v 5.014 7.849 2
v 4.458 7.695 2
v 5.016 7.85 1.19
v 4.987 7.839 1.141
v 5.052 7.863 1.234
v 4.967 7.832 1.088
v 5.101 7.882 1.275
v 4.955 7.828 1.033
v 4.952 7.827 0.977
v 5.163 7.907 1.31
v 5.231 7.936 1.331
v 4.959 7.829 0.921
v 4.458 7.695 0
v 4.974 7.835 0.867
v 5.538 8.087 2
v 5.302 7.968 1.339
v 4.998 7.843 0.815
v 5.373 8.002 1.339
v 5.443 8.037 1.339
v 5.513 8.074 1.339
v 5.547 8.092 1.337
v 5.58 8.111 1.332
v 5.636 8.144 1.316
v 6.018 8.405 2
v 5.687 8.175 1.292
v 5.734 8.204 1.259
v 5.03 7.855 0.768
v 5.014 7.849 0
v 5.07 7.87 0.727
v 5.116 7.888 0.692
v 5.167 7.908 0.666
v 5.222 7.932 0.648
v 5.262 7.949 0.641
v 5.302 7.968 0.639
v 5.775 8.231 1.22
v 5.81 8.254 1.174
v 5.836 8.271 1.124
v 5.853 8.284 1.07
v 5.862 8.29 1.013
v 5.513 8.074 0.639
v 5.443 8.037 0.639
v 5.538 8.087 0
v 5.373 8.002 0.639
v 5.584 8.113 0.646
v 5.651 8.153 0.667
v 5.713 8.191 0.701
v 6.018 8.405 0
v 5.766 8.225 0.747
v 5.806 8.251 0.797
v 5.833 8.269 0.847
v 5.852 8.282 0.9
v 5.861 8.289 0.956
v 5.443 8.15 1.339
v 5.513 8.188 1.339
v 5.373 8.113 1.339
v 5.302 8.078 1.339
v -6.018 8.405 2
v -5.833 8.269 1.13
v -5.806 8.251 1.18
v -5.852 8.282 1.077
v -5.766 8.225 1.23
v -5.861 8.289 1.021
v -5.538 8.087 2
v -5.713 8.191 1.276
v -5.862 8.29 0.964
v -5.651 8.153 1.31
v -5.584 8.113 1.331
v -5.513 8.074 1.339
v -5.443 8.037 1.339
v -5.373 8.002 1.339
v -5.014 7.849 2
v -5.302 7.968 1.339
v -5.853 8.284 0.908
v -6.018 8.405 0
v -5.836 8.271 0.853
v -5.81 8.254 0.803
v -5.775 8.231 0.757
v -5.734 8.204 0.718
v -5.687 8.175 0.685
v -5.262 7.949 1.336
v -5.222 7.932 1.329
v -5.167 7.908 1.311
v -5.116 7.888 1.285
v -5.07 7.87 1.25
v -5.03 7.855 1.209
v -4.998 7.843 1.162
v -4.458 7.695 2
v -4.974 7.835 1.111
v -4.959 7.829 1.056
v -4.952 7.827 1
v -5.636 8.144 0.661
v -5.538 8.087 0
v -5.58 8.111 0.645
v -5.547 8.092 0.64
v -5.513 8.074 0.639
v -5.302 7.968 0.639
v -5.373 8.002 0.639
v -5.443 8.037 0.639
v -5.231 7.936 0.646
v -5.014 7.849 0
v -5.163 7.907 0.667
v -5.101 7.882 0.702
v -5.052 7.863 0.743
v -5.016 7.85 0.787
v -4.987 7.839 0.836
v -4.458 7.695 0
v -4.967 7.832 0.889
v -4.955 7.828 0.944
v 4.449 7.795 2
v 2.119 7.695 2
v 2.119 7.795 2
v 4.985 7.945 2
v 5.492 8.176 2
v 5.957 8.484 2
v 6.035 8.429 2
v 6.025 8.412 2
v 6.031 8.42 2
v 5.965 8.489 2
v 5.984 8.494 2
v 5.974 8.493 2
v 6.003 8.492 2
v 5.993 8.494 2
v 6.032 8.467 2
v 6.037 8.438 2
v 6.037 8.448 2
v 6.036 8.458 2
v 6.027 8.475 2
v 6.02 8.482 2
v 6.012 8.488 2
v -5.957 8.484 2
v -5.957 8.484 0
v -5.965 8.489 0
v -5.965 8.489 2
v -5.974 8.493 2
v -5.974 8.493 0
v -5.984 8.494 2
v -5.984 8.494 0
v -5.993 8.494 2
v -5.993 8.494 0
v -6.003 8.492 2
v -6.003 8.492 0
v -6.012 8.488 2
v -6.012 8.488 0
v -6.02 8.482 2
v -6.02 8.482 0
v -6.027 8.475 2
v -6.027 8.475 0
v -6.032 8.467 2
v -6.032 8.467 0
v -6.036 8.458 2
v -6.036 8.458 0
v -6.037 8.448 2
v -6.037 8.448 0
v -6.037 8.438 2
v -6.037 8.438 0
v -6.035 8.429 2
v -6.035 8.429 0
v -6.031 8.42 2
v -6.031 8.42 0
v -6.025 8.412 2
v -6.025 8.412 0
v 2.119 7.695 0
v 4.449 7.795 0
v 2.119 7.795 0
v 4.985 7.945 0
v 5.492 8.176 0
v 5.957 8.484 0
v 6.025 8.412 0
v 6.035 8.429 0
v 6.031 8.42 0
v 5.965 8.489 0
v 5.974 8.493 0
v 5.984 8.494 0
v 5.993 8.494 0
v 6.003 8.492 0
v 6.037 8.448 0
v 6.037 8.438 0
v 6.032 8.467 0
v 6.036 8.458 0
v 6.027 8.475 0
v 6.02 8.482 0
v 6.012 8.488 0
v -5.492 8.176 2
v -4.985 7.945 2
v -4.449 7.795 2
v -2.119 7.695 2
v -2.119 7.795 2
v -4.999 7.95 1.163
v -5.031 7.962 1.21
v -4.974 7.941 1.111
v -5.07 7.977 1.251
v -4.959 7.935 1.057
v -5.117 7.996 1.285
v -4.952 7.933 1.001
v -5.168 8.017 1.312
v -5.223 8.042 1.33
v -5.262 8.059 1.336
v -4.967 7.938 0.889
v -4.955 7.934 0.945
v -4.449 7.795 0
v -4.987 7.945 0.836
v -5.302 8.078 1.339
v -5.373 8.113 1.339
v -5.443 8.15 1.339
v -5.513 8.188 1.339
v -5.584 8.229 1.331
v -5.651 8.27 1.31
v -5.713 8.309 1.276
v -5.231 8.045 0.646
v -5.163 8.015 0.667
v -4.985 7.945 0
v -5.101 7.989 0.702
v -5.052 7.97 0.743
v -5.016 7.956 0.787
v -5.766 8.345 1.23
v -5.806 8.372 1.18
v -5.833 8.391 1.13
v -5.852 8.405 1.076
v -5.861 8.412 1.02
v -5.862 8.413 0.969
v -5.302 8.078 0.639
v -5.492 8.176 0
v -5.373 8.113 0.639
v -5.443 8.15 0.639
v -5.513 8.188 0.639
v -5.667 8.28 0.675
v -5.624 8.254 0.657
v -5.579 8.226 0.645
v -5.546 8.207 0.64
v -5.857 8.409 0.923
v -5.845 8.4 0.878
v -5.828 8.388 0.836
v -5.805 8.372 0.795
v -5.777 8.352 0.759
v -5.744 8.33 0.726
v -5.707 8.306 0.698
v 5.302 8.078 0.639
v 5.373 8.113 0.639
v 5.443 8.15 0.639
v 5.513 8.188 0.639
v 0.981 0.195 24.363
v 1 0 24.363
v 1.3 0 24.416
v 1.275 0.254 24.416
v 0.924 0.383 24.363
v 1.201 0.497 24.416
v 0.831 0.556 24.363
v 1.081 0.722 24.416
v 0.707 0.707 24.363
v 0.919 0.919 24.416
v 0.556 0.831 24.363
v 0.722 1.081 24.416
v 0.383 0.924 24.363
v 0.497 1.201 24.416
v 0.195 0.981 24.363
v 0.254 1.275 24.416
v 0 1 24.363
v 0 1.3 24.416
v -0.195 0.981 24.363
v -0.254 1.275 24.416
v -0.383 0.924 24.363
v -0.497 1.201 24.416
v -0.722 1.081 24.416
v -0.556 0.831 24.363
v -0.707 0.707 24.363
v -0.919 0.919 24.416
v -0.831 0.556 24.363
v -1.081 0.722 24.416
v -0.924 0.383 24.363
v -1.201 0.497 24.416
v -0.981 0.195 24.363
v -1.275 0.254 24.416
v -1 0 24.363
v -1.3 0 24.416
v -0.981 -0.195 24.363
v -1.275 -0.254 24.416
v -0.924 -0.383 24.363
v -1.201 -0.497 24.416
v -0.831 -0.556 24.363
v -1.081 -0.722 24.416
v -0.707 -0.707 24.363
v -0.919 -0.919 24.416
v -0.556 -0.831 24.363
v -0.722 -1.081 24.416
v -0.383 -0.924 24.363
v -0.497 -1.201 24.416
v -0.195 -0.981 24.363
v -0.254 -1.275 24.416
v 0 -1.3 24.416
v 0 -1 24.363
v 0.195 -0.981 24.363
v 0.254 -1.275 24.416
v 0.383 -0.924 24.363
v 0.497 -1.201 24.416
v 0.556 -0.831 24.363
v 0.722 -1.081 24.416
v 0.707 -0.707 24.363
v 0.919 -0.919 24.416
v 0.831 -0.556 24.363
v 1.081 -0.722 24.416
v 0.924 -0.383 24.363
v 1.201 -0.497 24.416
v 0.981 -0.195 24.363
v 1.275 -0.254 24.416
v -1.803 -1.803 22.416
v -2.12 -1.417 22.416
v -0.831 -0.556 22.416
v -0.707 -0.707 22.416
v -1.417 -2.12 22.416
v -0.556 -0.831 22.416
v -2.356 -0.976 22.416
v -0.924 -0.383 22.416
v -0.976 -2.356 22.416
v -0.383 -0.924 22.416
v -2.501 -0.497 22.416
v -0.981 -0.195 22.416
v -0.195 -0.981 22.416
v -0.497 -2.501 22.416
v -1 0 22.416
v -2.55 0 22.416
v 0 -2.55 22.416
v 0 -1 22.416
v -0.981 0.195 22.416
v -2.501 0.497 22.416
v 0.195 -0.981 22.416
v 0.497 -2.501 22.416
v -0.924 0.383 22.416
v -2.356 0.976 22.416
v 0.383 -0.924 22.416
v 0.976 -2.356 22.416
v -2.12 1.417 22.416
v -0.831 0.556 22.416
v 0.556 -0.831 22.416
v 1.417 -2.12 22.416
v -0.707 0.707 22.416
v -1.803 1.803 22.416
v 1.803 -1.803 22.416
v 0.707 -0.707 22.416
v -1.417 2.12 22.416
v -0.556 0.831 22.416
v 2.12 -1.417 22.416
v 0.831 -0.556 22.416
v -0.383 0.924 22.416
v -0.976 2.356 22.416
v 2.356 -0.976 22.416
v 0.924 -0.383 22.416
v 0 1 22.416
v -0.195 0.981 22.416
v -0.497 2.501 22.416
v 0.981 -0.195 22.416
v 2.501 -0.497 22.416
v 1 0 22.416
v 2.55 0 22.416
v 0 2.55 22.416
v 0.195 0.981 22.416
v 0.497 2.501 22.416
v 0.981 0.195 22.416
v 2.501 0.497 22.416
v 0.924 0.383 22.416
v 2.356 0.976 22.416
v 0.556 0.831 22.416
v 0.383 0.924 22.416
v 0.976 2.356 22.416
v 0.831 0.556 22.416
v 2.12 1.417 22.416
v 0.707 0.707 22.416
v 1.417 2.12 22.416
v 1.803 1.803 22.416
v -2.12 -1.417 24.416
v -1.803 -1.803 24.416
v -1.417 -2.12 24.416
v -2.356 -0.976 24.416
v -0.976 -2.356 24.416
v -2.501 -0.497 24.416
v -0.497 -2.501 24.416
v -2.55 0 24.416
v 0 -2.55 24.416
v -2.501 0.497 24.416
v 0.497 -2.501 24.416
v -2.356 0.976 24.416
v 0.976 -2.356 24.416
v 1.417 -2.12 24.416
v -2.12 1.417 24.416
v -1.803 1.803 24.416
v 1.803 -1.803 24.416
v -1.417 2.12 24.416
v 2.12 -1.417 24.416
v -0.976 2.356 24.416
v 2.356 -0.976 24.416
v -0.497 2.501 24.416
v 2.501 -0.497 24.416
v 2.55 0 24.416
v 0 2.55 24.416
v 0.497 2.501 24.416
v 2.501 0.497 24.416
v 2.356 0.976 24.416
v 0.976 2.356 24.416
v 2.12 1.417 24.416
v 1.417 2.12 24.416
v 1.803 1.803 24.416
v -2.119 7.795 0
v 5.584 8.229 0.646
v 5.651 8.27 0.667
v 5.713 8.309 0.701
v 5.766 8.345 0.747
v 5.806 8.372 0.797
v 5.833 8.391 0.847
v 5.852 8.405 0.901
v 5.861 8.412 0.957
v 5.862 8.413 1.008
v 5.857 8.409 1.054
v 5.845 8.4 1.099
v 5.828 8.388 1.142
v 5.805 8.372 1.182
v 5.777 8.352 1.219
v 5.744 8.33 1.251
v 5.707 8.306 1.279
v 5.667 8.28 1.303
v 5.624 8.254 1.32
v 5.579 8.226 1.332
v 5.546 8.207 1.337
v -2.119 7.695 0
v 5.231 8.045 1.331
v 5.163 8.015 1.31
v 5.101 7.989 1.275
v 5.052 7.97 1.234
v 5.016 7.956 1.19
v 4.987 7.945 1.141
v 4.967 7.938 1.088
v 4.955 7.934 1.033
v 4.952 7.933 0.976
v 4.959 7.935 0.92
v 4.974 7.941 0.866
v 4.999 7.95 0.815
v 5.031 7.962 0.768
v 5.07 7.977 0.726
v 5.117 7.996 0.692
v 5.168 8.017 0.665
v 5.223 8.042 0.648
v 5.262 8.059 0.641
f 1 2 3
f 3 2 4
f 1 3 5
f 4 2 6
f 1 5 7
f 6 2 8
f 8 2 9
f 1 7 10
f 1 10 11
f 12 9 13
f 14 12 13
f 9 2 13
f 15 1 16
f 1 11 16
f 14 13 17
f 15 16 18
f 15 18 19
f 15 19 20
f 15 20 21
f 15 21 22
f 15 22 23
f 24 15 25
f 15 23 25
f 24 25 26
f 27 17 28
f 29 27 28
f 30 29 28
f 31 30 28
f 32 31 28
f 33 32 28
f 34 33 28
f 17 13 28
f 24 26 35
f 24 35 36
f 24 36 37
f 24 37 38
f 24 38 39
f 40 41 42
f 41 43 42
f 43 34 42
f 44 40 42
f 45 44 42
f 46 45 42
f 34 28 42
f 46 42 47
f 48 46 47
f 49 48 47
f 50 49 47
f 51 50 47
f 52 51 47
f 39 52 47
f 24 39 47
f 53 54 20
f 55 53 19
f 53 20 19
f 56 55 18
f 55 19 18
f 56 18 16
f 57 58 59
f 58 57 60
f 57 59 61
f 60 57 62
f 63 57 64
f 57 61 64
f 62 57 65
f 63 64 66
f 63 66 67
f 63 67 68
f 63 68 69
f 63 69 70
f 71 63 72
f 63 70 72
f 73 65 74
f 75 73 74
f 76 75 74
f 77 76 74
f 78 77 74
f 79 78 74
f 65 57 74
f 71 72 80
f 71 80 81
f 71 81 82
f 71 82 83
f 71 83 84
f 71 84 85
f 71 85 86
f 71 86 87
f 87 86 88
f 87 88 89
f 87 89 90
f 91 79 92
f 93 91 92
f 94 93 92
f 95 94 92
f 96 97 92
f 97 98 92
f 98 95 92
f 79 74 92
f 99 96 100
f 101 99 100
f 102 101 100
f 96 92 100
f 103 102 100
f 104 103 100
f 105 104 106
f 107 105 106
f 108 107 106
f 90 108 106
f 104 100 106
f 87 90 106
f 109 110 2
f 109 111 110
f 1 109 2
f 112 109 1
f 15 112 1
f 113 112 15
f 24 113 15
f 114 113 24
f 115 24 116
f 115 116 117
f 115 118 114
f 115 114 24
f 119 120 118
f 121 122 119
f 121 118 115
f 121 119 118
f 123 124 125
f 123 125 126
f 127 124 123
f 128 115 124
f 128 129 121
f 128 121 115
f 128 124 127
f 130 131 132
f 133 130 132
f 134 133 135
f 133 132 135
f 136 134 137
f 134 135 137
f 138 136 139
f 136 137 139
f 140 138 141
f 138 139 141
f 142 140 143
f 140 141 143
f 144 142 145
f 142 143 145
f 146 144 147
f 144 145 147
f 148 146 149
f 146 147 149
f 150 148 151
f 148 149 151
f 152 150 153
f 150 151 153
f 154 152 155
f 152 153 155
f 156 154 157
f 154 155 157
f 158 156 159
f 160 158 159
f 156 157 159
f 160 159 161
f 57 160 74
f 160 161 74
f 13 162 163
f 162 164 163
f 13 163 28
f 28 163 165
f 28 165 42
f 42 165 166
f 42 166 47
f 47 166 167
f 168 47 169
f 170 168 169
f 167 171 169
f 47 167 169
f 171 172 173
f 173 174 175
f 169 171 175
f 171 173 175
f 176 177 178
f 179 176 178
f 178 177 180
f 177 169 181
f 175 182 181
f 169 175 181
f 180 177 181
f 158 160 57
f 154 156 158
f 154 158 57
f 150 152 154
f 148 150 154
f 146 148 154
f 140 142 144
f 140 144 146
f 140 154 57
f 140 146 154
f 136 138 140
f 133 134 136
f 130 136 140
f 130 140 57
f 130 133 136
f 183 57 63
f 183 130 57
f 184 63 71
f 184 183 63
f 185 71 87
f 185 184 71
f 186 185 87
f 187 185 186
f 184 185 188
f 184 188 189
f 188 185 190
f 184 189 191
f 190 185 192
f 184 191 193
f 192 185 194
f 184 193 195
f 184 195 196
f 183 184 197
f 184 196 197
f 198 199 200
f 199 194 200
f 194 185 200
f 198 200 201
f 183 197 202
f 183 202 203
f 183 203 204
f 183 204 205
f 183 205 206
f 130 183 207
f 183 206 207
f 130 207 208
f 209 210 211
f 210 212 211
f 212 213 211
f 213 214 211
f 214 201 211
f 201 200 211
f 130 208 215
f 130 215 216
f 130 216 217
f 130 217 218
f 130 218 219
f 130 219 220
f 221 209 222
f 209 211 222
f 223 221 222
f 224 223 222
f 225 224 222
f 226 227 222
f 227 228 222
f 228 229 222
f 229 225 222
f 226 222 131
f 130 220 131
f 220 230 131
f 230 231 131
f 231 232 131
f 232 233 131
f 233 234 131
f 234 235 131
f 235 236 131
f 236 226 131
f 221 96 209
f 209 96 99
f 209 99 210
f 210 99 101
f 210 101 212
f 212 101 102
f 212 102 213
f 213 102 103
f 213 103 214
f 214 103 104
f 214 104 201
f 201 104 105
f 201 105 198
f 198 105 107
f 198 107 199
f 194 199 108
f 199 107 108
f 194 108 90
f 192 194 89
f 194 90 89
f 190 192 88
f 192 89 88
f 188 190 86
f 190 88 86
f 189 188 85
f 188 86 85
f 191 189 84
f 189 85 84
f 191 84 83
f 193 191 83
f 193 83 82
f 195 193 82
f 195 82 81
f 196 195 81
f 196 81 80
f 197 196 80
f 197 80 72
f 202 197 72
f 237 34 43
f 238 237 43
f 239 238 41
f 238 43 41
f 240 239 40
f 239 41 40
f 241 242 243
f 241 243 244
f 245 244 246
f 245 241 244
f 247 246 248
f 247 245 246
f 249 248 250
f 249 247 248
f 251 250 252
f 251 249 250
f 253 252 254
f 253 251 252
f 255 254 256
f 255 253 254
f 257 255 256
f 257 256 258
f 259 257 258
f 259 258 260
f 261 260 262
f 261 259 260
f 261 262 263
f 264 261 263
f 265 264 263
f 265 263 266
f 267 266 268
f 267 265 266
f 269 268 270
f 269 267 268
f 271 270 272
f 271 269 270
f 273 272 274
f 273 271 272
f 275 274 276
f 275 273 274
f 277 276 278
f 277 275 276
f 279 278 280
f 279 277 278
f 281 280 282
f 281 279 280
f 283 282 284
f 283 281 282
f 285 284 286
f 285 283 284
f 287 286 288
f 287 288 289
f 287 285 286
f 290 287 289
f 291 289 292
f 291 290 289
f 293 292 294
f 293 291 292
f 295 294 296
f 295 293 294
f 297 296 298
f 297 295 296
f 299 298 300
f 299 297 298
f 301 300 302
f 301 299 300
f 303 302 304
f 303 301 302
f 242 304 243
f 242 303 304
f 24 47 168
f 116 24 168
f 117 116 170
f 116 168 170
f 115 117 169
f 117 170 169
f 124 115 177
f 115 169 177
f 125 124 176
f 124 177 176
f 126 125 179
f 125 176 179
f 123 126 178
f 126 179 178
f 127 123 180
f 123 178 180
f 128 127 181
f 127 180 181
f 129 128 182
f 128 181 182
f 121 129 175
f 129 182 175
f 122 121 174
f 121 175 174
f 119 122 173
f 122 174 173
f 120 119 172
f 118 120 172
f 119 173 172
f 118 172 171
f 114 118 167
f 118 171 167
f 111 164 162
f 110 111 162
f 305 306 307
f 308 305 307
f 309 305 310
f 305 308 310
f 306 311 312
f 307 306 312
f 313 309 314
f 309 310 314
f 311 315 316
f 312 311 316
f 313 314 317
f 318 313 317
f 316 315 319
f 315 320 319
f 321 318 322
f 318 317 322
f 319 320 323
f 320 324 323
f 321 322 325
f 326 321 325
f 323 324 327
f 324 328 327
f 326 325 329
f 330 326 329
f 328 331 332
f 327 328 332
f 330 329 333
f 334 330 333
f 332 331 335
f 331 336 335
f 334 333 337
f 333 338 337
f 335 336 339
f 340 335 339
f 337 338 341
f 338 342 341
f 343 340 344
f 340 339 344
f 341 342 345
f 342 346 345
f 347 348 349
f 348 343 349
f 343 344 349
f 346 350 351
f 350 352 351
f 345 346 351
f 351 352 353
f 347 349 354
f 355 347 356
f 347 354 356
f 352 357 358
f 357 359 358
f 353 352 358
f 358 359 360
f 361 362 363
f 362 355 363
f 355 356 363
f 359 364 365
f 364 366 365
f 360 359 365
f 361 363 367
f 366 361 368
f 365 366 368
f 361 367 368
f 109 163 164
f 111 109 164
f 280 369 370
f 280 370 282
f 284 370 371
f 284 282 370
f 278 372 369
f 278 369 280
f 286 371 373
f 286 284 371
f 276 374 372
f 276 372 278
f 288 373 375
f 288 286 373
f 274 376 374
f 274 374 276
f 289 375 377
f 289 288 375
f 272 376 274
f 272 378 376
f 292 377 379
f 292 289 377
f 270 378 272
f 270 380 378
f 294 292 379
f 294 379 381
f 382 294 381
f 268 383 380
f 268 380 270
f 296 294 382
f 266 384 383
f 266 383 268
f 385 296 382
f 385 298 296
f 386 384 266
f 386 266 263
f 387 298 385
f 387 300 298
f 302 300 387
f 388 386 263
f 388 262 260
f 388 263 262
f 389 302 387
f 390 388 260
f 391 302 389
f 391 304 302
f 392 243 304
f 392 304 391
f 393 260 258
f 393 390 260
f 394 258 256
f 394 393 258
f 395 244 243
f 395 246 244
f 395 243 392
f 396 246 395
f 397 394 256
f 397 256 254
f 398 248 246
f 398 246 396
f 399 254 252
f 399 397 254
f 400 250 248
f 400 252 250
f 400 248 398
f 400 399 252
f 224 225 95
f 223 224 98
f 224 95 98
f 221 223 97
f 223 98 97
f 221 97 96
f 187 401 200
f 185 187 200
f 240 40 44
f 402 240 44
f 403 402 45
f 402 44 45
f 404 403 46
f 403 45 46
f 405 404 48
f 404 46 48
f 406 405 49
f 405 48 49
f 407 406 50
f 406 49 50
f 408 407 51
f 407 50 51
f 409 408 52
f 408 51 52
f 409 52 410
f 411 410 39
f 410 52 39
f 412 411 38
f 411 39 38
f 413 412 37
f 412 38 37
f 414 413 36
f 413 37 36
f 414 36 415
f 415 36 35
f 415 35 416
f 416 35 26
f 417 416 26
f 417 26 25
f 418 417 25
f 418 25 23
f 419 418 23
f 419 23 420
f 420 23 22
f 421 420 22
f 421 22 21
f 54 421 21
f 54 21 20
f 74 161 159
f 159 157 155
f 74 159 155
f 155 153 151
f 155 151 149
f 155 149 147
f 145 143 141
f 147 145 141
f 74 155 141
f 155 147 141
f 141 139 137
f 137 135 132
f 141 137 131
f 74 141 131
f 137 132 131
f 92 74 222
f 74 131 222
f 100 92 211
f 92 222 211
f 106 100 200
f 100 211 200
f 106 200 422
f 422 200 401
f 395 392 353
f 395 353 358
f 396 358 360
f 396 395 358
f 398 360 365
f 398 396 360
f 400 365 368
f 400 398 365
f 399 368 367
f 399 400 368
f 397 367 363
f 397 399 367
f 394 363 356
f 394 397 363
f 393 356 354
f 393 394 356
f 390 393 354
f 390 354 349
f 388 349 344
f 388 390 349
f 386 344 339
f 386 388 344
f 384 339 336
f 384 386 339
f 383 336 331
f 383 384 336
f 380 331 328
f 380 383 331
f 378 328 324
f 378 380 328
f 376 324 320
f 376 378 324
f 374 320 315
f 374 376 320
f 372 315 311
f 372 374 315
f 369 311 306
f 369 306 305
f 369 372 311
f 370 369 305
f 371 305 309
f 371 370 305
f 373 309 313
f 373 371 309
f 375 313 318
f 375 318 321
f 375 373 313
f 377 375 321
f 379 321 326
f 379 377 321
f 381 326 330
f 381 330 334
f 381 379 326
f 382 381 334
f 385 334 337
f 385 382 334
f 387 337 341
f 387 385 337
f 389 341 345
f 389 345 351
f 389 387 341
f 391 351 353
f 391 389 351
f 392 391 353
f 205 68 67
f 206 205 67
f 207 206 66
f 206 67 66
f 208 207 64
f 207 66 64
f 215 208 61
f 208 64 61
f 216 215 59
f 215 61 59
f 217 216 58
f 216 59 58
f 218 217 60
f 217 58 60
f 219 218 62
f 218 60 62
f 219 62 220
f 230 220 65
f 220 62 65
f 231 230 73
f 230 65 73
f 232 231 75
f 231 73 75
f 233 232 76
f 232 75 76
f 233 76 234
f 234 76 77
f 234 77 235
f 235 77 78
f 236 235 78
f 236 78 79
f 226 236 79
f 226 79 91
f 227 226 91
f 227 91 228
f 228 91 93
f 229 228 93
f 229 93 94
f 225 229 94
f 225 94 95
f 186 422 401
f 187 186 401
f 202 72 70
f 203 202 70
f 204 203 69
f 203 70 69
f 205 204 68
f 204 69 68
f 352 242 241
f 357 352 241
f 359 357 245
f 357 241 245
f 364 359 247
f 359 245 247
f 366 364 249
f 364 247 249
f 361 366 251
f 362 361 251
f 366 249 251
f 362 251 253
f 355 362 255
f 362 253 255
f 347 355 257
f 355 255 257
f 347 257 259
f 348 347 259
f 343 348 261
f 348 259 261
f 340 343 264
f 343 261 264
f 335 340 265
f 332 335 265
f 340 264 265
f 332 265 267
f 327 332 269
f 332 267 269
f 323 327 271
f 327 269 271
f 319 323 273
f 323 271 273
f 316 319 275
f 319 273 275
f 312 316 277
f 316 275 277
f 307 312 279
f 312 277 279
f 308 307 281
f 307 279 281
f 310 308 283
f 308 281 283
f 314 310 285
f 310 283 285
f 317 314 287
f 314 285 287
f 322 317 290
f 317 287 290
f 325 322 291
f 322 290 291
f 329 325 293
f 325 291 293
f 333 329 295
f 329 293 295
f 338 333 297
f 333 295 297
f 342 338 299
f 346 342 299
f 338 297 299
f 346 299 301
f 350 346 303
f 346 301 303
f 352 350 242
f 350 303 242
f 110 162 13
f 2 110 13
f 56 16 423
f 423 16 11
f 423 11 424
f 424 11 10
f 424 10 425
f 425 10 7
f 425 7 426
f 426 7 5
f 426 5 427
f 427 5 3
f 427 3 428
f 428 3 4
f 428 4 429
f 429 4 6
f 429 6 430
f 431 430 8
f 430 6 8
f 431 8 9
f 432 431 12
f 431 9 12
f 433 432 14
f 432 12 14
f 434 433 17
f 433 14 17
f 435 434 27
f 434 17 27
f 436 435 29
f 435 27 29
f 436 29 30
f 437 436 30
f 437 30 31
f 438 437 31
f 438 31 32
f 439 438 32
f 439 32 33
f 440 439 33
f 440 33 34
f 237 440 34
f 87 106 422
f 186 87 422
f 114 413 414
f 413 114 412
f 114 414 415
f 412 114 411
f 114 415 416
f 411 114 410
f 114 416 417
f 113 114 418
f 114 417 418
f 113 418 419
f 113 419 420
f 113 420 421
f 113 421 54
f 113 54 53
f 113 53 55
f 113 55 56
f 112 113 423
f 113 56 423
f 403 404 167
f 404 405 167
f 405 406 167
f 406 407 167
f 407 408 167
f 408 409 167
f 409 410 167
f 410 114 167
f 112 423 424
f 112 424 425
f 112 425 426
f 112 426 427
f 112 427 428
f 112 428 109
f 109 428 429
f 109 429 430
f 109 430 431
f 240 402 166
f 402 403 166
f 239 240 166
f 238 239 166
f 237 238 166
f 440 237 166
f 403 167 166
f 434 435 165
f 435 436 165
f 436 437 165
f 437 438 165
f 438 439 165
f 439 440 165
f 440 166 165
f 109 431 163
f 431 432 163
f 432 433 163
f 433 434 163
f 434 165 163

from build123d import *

# Parameters (mm, degrees)
BOSS_EXTRUDE1_DEPTH   = 2
BOSS_EXTRUDE1_2_DEPTH = 2
CUT_EXTRUDE1_DEPTH    = 2
SKETCH3_R             = 2.55
SKETCH3_R_2           = 1
BOSS_EXTRUDE2_DEPTH   = 2
CHAMFER1_SIZE         = 0.3
CHAMFER1_SIZE2        = 0.052898094


with BuildPart() as part:
    # Sketch1 → Boss-Extrude1 (new body)
    with BuildSketch(Plane.XY):
        with BuildLine():
            Line((2.119201361, 7.695095724), (4.458497719, 7.695095724))
            ThreePointArc((4.458497719, 7.695095724), (5.28034288, 7.957709004), (6.018106177, 8.40503497))
            ThreePointArc((6.018106177, 8.40503497), (6.026743298, 8.475216166), (5.956562103, 8.483853287))
            ThreePointArc((5.956562103, 8.483853287), (5.243250103, 8.05070086), (4.448831418, 7.795095724))
            Line((4.448831418, 7.795095724), (2.119201361, 7.795095724))
            Line((2.119201361, 7.795095724), (2.119201361, 7.695095724))
        make_face()
    extrude(amount=BOSS_EXTRUDE1_DEPTH)


with BuildPart() as body_2:
    # Sketch1 → Boss-Extrude1 2 (new body)
    with BuildSketch(Plane.XY):
        with BuildLine():
            Line((-2.119201361, 7.695095724), (-2.119201361, 7.795095724))
            Line((-2.119201361, 7.795095724), (-4.448831418, 7.795095724))
            ThreePointArc((-4.448831418, 7.795095724), (-5.243250103, 8.05070086), (-5.956562103, 8.483853287))
            ThreePointArc((-5.956562103, 8.483853287), (-6.026743298, 8.475216166), (-6.018106177, 8.40503497))
            ThreePointArc((-6.018106177, 8.40503497), (-5.28034288, 7.957709004), (-4.458497719, 7.695095724))
            Line((-4.458497719, 7.695095724), (-2.119201361, 7.695095724))
        make_face()
    extrude(amount=BOSS_EXTRUDE1_2_DEPTH)


with BuildPart() as cut_extrude1_tool:
    # Sketch2 → Cut-Extrude1 (new body)
    with BuildSketch(Plane.XZ.offset(-7.695095724)):
        with BuildLine():
            Line((5.30218152, 0.638571522), (5.512812284, 0.638571522))
            ThreePointArc((5.512812284, 0.638571522), (5.862812284, 0.988571522), (5.512812284, 1.338571522))
            Line((5.512812284, 1.338571522), (5.30218152, 1.338571522))
            ThreePointArc((5.30218152, 1.338571522), (4.95218152, 0.988571522), (5.30218152, 0.638571522))
        make_face()
        with BuildLine():
            Line((-5.30218152, 1.338571522), (-5.512812284, 1.338571522))
            ThreePointArc((-5.512812284, 1.338571522), (-5.862812284, 0.988571522), (-5.512812284, 0.638571522))
            Line((-5.512812284, 0.638571522), (-5.30218152, 0.638571522))
            ThreePointArc((-5.30218152, 0.638571522), (-4.95218152, 0.988571522), (-5.30218152, 1.338571522))
        make_face()
    extrude(amount=-CUT_EXTRUDE1_DEPTH)


with BuildPart() as part_1:
    add(part.part)

    # Cut-Extrude1: cut by cut_extrude1_tool
    add(cut_extrude1_tool.part, mode=Mode.SUBTRACT)


with BuildPart() as body_2_1:
    add(body_2.part)

    # Cut-Extrude1: cut by cut_extrude1_tool
    add(cut_extrude1_tool.part, mode=Mode.SUBTRACT)


with BuildPart() as body_3:
    # Sketch3 → Boss-Extrude2 (new body)
    with BuildSketch(Plane.XY.offset(24.416132501)):
        Circle(SKETCH3_R)
        Circle(SKETCH3_R_2, mode=Mode.SUBTRACT)
    extrude(amount=-BOSS_EXTRUDE2_DEPTH)

    # Chamfer1
    chamfer1_edges = [body_3.edges().sort_by_distance(p)[0] for p in [
        (-1, 0, 24.416132501),
    ]]
    chamfer1_side = [body_3.faces().sort_by_distance(p)[0] for p in [
        (-2.477875108, 0, 24.416132501),
    ]]
    chamfer(chamfer1_edges, length=CHAMFER1_SIZE, length2=CHAMFER1_SIZE2, reference=chamfer1_side[0])


solid = Compound([part_1.part, body_2_1.part, body_3.part])
